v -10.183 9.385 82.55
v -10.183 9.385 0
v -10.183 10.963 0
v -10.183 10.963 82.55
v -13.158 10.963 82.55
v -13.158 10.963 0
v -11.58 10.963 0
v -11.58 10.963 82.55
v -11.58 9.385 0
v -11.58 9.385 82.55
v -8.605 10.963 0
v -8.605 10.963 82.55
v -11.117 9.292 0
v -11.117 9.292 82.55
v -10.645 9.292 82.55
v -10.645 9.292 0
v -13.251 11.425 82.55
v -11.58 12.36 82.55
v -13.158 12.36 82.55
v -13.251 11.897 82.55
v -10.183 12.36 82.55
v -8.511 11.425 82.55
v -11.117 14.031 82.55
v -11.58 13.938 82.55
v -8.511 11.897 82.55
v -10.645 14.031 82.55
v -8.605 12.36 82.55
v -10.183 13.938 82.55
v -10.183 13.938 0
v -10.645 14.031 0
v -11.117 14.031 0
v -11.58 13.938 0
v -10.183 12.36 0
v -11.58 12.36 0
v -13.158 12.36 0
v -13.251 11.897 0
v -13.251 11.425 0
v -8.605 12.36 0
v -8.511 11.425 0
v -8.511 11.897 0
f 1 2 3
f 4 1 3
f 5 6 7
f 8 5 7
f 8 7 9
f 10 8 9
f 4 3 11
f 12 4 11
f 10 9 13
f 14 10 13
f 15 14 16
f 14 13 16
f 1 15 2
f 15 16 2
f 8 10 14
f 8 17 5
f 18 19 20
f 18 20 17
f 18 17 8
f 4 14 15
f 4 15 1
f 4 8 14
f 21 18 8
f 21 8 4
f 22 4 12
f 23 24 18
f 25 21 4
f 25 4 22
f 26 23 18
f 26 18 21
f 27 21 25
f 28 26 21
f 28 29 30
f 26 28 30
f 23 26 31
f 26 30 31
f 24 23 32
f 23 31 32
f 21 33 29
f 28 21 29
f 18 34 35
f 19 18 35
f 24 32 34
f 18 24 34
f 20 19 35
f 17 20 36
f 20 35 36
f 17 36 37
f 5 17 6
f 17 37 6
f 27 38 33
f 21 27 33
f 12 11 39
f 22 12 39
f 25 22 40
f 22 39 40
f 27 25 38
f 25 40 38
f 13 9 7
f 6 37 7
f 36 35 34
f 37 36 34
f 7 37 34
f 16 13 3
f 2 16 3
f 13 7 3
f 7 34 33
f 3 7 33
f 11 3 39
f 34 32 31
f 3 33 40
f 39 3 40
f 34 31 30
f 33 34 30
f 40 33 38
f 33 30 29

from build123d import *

# Parameters (mm, degrees)
F1_DEPTH = 82.55


with BuildPart() as f1:
    # F0 (on Top) → F1 (new body)
    with BuildSketch(Plane.XY):
        with BuildLine():
            Line((-11.57952, 10.962582), (-11.57952, 9.384583))
            ThreePointArc((-11.57952, 9.384583), (-10.88102, 9.279832), (-10.18252, 9.384583))
            Line((-10.18252, 9.384583), (-10.18252, 10.962582))
            Line((-10.18252, 10.962582), (-8.604521, 10.962582))
            ThreePointArc((-8.604521, 10.962582), (-8.49977, 11.661082), (-8.604521, 12.359582))
            Line((-8.604521, 12.359582), (-10.18252, 12.359582))
            Line((-10.18252, 12.359582), (-10.18252, 13.937582))
            ThreePointArc((-10.18252, 13.937582), (-10.88102, 14.042332), (-11.57952, 13.937582))
            Line((-11.57952, 13.937582), (-11.57952, 12.359582))
            Line((-11.57952, 12.359582), (-13.157519, 12.359582))
            ThreePointArc((-13.157519, 12.359582), (-13.26227, 11.661082), (-13.157519, 10.962582))
            Line((-13.157519, 10.962582), (-11.57952, 10.962582))
        make_face()
    extrude(amount=F1_DEPTH)


solid = f1.part
